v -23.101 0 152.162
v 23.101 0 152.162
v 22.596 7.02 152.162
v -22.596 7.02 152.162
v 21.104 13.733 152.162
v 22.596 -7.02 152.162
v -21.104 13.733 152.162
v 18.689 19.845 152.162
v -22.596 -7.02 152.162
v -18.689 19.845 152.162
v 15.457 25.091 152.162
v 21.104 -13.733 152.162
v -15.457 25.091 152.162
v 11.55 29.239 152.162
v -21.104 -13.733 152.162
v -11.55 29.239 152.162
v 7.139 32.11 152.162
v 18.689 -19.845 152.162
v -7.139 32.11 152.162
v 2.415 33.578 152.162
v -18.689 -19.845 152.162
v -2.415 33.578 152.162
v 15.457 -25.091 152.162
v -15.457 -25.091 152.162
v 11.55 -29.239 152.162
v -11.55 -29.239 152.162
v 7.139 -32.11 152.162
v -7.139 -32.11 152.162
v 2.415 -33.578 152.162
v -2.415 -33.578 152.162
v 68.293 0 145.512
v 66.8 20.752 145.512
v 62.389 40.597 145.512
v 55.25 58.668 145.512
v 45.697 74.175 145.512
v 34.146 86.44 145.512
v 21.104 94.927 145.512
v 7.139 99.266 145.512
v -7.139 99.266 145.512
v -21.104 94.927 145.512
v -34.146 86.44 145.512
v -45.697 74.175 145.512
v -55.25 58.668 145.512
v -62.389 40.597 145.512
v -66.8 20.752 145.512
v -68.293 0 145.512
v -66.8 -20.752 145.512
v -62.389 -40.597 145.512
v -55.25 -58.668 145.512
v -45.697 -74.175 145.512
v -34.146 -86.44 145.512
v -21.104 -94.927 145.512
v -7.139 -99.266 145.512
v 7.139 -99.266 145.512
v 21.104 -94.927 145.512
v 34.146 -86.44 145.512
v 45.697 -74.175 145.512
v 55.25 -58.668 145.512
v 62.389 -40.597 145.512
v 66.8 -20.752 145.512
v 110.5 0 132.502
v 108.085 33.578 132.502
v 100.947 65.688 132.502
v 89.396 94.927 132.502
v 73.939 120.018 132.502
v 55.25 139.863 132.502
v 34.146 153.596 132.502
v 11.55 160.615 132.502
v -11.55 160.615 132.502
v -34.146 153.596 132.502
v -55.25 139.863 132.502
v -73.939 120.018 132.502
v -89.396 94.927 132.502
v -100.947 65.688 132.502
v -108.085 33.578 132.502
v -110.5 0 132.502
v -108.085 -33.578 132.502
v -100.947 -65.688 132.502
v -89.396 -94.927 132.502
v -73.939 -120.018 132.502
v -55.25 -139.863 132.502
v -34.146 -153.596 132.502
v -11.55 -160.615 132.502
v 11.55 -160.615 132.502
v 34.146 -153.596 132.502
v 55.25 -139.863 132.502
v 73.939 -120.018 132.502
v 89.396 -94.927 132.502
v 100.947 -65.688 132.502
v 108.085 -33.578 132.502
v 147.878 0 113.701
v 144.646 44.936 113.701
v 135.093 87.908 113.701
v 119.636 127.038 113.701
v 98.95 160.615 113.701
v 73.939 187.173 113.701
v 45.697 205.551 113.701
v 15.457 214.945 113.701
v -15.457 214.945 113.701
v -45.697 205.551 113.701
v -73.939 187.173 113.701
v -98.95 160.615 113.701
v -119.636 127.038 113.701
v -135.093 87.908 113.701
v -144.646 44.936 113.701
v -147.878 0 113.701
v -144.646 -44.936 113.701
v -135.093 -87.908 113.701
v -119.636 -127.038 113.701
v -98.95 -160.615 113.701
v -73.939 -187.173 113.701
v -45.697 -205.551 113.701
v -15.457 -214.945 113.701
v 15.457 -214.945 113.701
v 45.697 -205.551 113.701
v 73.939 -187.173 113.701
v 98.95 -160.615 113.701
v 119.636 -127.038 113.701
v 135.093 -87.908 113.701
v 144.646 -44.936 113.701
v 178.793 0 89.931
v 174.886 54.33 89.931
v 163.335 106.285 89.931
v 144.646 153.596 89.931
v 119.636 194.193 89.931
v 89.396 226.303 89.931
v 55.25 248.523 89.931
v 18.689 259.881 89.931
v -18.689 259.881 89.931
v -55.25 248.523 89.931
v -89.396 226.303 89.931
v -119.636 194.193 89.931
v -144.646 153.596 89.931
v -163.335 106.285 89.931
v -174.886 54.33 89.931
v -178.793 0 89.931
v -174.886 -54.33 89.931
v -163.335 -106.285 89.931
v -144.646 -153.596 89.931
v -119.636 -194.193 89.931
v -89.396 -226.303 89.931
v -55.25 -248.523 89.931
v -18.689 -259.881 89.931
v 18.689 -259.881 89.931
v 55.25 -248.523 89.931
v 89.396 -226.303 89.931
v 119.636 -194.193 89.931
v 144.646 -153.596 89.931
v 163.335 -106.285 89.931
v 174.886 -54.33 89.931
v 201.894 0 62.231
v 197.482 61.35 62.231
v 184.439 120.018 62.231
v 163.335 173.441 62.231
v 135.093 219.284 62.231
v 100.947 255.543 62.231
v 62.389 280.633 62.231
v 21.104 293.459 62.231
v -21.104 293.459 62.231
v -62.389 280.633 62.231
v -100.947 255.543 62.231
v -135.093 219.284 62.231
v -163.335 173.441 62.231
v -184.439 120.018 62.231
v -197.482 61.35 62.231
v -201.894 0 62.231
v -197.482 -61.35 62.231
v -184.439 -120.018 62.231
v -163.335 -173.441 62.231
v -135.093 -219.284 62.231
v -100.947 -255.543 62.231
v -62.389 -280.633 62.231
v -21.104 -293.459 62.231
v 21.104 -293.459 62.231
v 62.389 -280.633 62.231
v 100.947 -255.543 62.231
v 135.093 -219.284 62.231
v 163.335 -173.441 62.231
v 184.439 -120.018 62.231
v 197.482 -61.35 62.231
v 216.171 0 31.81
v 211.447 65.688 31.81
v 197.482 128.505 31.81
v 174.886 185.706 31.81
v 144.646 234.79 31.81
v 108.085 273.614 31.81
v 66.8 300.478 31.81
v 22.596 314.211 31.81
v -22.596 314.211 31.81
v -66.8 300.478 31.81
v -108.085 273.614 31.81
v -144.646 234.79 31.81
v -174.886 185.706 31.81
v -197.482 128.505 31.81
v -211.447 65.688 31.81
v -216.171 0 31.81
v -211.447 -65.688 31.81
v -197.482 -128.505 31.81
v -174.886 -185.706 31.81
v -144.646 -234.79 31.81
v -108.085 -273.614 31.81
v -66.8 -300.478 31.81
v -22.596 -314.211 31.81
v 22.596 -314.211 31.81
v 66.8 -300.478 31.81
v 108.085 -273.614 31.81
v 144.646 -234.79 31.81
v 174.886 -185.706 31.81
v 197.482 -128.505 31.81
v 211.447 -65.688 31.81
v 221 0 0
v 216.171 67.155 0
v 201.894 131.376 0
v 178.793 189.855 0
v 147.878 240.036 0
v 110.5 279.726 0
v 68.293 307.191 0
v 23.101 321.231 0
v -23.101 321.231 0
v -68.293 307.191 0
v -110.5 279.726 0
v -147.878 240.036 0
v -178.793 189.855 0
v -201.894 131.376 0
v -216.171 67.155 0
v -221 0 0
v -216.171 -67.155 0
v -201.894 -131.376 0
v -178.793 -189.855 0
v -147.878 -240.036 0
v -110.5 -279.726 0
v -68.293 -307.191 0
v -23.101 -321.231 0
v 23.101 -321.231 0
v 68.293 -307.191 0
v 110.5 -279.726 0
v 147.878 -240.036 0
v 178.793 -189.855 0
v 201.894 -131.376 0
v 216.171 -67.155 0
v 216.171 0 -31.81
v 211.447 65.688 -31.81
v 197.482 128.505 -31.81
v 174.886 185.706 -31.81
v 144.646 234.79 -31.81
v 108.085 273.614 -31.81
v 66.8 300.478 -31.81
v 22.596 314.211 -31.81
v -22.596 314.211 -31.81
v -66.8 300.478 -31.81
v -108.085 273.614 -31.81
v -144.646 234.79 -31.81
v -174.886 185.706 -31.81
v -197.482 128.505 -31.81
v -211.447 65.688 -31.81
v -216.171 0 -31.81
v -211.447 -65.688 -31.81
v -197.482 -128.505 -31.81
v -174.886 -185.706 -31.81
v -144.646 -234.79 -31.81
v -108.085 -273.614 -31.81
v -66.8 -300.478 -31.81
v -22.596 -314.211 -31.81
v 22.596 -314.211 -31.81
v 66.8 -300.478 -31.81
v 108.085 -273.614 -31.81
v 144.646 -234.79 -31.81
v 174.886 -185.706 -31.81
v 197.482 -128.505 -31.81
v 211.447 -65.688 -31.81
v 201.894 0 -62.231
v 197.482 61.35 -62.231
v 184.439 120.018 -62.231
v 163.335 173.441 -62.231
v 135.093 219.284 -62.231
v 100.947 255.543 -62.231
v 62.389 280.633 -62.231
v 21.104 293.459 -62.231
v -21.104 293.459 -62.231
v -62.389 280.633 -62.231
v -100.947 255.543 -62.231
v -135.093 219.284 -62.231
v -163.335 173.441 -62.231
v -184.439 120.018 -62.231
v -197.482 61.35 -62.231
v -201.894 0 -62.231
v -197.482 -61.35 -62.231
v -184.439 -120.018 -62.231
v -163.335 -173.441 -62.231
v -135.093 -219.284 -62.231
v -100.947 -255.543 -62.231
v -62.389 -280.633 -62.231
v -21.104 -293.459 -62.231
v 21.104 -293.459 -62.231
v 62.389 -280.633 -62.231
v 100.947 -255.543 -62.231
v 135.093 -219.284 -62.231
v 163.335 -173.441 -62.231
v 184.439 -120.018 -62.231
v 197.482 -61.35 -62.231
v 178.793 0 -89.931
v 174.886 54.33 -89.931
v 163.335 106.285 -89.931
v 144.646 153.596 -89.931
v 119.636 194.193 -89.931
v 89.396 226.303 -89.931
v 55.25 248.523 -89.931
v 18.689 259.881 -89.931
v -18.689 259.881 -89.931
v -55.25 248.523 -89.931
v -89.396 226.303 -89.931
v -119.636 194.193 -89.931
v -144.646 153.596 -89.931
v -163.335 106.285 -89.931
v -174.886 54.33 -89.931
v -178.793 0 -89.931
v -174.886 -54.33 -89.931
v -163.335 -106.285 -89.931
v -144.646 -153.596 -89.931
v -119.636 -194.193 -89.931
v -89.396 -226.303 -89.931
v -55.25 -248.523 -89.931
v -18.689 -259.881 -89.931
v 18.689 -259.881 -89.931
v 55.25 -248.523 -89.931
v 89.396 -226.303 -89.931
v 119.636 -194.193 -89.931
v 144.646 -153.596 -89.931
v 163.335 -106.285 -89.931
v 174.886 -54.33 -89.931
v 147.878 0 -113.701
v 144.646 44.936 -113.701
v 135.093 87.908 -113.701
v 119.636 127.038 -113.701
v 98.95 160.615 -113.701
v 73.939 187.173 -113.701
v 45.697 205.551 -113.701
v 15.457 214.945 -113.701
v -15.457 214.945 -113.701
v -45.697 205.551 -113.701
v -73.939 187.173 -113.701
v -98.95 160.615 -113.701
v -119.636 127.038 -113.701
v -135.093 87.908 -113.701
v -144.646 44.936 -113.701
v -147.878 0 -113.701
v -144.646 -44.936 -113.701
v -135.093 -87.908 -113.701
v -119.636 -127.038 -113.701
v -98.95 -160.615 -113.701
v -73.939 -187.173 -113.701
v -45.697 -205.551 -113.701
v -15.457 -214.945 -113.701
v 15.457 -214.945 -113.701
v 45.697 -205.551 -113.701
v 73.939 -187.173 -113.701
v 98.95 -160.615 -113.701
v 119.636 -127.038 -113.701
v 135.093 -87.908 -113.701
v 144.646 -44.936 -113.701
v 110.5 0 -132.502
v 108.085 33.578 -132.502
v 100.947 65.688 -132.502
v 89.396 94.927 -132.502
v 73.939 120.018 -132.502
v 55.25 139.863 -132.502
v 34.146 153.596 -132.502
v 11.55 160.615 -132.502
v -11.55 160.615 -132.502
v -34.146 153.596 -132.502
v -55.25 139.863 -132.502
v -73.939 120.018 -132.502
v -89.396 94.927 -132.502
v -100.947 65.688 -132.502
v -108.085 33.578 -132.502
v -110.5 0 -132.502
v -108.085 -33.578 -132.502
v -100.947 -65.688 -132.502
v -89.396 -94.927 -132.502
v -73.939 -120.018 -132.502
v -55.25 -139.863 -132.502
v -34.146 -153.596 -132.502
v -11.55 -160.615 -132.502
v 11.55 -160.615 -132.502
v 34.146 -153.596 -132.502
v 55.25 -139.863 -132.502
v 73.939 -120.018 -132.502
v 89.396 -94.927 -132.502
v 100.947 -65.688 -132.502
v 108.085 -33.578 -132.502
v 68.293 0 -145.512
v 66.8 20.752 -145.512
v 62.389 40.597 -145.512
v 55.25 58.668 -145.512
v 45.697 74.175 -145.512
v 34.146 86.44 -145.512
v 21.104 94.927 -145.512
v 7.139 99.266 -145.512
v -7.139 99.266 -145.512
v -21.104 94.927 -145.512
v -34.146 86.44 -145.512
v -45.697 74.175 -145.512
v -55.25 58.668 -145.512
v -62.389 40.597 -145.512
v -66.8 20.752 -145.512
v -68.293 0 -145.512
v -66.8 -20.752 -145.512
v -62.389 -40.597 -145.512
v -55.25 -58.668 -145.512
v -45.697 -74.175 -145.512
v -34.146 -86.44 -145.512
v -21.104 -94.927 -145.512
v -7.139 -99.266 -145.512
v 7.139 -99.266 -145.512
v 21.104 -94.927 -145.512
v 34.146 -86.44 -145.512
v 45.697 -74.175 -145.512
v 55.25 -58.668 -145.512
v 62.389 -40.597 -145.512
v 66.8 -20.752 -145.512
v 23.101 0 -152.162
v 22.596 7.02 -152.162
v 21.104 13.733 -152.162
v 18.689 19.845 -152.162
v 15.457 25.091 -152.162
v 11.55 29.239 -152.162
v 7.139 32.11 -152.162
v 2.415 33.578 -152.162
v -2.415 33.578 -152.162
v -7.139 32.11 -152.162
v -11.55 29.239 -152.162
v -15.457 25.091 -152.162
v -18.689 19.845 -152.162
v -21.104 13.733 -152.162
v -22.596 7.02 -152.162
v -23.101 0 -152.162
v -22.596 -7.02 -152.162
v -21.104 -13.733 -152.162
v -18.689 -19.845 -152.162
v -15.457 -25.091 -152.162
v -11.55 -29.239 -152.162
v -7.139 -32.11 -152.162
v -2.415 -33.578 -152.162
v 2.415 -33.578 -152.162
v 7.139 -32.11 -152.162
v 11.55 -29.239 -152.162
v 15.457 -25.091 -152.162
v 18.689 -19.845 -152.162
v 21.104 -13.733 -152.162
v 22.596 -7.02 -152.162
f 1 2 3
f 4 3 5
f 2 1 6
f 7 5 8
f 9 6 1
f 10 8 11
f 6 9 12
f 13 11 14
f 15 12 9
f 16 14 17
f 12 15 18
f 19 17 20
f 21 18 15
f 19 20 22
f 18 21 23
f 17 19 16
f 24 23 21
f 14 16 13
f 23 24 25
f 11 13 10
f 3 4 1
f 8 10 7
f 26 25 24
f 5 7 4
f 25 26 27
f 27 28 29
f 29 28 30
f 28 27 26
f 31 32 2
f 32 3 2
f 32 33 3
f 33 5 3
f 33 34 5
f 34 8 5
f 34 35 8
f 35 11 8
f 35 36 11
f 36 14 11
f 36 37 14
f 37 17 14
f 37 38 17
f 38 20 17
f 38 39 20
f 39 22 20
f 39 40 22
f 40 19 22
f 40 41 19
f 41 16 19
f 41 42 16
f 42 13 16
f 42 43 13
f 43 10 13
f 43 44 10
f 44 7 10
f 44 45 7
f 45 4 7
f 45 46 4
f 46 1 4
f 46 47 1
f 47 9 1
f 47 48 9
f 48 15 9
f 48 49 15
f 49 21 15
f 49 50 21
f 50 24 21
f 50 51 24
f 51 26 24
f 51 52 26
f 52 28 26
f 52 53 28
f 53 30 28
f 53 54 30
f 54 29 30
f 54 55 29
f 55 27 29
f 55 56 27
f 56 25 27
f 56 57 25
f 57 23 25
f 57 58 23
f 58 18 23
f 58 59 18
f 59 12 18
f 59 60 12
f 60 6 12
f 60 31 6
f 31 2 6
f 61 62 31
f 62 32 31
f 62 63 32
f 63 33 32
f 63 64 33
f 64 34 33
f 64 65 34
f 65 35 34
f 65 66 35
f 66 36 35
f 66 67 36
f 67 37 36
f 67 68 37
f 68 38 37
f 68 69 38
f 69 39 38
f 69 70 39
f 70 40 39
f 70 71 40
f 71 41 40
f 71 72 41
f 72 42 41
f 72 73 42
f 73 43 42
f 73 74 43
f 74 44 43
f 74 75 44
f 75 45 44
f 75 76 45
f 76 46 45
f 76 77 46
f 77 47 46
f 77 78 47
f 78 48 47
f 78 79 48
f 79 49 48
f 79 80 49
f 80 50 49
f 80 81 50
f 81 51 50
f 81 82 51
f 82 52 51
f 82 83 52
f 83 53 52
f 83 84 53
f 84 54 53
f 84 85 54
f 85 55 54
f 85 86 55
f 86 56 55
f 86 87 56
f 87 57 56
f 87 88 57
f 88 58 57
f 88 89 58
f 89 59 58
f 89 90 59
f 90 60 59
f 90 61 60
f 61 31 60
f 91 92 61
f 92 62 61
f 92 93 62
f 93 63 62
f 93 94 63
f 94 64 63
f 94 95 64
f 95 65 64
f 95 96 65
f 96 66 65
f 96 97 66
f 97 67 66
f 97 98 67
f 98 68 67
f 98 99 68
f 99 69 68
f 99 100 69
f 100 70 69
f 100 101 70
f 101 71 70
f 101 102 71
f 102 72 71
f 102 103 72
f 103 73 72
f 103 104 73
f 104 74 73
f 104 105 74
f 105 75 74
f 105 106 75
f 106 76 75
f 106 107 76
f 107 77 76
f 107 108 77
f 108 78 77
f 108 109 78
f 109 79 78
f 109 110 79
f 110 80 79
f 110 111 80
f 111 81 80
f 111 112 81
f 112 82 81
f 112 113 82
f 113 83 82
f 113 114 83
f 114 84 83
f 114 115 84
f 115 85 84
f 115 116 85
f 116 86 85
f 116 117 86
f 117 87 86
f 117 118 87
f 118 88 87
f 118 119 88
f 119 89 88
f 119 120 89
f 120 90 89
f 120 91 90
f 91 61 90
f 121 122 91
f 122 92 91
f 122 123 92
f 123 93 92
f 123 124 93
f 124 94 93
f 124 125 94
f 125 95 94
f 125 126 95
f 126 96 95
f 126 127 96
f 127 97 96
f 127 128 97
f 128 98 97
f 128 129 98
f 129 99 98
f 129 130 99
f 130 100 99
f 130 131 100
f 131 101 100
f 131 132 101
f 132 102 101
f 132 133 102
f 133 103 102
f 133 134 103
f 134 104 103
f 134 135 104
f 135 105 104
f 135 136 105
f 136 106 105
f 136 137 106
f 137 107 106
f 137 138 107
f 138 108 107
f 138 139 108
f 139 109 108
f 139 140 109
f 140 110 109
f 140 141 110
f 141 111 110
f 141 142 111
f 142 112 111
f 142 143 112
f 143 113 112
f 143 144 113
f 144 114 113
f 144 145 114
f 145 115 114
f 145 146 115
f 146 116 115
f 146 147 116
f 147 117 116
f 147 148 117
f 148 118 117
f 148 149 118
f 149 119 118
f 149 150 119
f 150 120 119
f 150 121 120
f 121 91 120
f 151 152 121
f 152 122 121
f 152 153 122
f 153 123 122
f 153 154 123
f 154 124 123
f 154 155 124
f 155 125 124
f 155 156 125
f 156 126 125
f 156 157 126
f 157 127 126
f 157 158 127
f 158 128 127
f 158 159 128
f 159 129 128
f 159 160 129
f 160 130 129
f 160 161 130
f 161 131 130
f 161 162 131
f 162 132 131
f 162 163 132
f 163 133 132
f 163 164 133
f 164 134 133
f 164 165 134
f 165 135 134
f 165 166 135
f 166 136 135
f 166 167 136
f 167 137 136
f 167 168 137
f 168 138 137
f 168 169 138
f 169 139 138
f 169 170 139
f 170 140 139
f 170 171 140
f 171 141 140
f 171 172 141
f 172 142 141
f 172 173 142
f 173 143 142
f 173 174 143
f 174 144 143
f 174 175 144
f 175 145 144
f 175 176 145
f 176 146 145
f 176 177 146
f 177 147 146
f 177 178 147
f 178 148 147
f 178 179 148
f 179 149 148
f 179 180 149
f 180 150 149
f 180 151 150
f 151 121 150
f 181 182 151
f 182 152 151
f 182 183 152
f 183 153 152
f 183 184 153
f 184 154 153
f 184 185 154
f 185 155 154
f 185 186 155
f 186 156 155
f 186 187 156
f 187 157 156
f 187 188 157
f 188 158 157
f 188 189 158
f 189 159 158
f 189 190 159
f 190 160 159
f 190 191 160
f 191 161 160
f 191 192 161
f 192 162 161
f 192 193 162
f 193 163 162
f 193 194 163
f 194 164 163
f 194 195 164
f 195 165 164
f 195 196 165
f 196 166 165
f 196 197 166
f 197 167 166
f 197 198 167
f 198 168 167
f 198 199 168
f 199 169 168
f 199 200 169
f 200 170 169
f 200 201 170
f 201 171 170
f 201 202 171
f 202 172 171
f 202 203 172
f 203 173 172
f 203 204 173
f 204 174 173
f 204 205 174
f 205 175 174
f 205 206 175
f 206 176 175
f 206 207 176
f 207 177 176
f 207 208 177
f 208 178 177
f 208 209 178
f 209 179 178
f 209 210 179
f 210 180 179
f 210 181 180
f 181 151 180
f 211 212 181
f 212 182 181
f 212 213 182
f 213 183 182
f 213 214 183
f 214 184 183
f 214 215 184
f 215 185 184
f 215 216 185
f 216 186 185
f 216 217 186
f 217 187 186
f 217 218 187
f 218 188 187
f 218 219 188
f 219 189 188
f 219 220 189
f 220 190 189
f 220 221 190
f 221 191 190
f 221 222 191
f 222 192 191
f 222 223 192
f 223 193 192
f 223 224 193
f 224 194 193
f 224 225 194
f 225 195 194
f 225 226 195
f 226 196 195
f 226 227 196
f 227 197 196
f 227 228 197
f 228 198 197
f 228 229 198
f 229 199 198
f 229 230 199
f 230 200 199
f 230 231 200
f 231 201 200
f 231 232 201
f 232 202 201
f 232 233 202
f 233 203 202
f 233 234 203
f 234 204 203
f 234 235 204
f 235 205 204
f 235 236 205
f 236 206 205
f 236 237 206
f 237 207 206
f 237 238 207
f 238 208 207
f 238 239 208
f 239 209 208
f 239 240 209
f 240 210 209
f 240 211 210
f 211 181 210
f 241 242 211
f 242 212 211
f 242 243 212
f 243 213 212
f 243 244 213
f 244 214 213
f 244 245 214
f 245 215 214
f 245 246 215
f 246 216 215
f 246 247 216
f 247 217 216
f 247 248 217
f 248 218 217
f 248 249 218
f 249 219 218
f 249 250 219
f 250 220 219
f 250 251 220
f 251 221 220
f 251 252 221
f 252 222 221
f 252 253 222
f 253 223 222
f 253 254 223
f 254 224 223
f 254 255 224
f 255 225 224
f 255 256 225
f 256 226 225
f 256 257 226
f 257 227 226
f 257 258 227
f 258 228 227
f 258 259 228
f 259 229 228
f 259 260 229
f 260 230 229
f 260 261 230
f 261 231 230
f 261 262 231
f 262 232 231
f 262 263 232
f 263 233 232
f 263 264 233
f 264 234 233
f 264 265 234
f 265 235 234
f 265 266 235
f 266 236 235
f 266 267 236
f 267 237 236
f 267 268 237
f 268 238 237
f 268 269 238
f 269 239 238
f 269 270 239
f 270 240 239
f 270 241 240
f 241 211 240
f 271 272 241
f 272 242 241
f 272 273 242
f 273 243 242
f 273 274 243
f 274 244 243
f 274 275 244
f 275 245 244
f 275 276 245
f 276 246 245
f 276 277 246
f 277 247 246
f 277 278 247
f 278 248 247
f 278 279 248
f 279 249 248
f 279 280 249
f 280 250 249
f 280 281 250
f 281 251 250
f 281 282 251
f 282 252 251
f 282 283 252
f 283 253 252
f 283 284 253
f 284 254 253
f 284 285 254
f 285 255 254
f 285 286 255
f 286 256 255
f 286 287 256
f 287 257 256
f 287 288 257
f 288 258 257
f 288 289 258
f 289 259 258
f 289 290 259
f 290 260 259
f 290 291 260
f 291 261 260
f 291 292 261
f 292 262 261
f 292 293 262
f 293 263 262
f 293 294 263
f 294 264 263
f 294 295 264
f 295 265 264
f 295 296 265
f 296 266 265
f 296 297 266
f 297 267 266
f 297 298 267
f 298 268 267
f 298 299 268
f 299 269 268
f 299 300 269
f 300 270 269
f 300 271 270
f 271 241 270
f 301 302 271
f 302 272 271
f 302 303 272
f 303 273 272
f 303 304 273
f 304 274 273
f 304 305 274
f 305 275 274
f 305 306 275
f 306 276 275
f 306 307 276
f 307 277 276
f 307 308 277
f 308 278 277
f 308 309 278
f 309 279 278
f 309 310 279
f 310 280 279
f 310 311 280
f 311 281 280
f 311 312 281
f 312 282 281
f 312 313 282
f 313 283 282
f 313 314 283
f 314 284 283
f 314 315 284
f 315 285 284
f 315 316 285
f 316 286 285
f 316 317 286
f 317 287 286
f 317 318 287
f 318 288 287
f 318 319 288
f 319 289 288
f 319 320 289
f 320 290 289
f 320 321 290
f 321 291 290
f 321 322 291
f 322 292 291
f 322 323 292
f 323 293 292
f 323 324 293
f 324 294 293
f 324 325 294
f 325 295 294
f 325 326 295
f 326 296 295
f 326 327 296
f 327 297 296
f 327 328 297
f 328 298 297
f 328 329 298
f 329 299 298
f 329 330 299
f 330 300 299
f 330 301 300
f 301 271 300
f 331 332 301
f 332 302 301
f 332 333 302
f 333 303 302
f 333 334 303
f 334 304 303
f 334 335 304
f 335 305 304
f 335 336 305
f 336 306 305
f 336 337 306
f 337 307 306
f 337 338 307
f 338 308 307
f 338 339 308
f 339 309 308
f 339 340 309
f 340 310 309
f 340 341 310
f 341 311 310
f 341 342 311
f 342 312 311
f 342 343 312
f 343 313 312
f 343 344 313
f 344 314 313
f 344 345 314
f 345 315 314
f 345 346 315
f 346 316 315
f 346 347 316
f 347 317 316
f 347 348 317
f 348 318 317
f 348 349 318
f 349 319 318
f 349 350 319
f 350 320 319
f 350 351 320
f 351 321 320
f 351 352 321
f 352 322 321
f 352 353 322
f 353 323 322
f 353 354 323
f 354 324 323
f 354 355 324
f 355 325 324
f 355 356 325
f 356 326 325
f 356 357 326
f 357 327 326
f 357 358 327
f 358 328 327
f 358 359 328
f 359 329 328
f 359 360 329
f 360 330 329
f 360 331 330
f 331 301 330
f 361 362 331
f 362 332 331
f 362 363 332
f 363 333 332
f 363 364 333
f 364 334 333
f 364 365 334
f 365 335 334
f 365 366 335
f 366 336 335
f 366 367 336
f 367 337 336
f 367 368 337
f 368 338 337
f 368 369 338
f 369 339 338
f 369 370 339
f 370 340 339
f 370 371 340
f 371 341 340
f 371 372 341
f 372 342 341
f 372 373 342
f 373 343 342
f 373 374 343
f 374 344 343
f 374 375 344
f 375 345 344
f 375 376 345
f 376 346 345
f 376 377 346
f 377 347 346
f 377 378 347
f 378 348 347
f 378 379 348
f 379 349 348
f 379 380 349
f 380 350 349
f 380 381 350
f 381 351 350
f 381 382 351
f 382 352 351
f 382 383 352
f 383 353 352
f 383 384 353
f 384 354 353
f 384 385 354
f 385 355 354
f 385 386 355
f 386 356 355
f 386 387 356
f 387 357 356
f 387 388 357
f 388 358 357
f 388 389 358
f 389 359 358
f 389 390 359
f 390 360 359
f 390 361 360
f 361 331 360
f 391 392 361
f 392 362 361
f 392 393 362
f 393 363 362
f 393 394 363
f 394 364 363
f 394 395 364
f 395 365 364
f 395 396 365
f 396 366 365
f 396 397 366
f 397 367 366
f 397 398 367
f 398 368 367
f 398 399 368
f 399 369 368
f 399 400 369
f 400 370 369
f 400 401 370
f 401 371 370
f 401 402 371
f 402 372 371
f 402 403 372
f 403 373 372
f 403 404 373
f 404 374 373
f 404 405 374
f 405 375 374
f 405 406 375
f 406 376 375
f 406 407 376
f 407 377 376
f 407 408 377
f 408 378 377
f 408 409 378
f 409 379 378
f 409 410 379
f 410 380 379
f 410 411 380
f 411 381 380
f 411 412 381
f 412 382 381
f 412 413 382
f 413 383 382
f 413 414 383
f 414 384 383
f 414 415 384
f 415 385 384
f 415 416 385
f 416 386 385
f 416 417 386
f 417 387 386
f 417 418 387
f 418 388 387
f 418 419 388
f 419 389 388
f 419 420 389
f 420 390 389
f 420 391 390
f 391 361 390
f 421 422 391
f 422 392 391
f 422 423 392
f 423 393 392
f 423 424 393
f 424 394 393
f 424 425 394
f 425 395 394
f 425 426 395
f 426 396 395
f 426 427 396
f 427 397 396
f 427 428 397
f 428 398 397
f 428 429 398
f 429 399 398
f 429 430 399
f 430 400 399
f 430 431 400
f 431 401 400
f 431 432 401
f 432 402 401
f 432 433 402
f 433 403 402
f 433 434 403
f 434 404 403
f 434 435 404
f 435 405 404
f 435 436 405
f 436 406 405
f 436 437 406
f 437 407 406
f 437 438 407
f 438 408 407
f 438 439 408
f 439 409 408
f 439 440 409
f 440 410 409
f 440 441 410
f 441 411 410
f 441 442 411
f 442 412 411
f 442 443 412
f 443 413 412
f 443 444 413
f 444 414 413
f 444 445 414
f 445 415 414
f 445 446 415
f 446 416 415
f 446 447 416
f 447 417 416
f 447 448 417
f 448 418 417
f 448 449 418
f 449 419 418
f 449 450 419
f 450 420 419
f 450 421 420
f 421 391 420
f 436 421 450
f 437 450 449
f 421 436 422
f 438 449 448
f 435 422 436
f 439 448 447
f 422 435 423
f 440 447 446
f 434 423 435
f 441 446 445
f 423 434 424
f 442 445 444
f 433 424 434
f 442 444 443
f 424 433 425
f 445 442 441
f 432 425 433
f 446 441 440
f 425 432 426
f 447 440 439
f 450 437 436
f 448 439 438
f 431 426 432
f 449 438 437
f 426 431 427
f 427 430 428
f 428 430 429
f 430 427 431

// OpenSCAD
// Generated by SolidPython 1.0.1 on 2020-07-29 00:46:51


scale(v = [13, 19, 9]) {
	sphere(r = 17);
}
/***********************************************
*********      SolidPython code:      **********
************************************************
 
# import packages: SolidPython
from solid import *
from solid.utils import *
from itertools import chain, combinations, permutations


class Resize:

    def __init__(self, scad_file):
        self.scad_file = scad_file
        #self.scad_file = import_scad(scad_file)
        # cone/cylinder param:
        self.r1 = 0
        self.r2 = 0
        self.h = 0
        # rectangular prism param:
        self.w = 0
        self.l = 0
        # ellipse param:
        self.r = 0

    # import OpenScad code (file name corresponds to shape)


    # classify shape + parameters
    def assign(self, param1, param2, param3):
        if self.scad_file == 'cone.scad':
            self.r1 = param1
            self.r2 = param2
            self.h = param3
        elif self.scad_file == 'cylinder.scad':
            self.r1 = param1
            self.r2 = param2
            self.h = param3
        elif self.scad_file == 'rectangularPrism.scad':
            self.h = param1
            self.l = param2
            self.w = param3
        else:
            self.r = param1
            self.h = param2

    # resize parameters
    def iterate(self):
        x = range(3, 20, 2)
        i = 1
        if self.scad_file == 'cone.scad':
            tempList = list(permutations(x, 2))
            for temp in tempList:
                param1 = temp[0]
                param2 = temp[1]
                filepath = 'produced_scad_files/' + 'cone' + str(param1) + '_' + str(param2) + '_' + '.scad'
                scad_render_to_file(cylinder(h=param1, r1=param2, r2=0), filepath)

        elif self.scad_file == 'cylinder.scad':
            tempList = list(permutations(x, 3))
            for temp in tempList:
                param1 = temp[0]
                param2 = temp[1]
                filepath = 'produced_scad_files/' + 'cylinder' + str(param1) + '_' + str(param2) + '_' + '.scad'
                scad_render_to_file(cylinder(h=param1, r1=param2, r2=param2), filepath)

        elif self.scad_file == 'rectangularPrism.scad':
            tempList = list(permutations(x, 3))
            for temp in tempList:
                param1 = temp[0]
                param2 = temp[1]
                param3 = temp[2]
                filepath = 'produced_scad_files/' + 'rectangularPrism' + str(param1) + '_' + str(param2) + '_' + str(
                    param3) + '.scad'
                scad_render_to_file(cube(size=(param1, param2, param3)), filepath)

        elif self.scad_file == 'ellipse.scad':
            tempList = list(permutations(x, 4))
            for temp in tempList:
                param1 = temp[0]
                param2 = temp[1]
                param3 = temp[2]
                param4 = temp[3]
                filepath = 'produced_scad_files/' + 'ellipse' + str(param1) + '_' + str(param2) + '_' + str(param3) + '_' + str(param4) + '.scad'
                scad_render_to_file(scale([param1, param2, param3])(sphere(r=param4)), filepath)

    def render_to_scadfile(self):
        scad_render_to_file(scad, 'example.scad') 
 
************************************************/
